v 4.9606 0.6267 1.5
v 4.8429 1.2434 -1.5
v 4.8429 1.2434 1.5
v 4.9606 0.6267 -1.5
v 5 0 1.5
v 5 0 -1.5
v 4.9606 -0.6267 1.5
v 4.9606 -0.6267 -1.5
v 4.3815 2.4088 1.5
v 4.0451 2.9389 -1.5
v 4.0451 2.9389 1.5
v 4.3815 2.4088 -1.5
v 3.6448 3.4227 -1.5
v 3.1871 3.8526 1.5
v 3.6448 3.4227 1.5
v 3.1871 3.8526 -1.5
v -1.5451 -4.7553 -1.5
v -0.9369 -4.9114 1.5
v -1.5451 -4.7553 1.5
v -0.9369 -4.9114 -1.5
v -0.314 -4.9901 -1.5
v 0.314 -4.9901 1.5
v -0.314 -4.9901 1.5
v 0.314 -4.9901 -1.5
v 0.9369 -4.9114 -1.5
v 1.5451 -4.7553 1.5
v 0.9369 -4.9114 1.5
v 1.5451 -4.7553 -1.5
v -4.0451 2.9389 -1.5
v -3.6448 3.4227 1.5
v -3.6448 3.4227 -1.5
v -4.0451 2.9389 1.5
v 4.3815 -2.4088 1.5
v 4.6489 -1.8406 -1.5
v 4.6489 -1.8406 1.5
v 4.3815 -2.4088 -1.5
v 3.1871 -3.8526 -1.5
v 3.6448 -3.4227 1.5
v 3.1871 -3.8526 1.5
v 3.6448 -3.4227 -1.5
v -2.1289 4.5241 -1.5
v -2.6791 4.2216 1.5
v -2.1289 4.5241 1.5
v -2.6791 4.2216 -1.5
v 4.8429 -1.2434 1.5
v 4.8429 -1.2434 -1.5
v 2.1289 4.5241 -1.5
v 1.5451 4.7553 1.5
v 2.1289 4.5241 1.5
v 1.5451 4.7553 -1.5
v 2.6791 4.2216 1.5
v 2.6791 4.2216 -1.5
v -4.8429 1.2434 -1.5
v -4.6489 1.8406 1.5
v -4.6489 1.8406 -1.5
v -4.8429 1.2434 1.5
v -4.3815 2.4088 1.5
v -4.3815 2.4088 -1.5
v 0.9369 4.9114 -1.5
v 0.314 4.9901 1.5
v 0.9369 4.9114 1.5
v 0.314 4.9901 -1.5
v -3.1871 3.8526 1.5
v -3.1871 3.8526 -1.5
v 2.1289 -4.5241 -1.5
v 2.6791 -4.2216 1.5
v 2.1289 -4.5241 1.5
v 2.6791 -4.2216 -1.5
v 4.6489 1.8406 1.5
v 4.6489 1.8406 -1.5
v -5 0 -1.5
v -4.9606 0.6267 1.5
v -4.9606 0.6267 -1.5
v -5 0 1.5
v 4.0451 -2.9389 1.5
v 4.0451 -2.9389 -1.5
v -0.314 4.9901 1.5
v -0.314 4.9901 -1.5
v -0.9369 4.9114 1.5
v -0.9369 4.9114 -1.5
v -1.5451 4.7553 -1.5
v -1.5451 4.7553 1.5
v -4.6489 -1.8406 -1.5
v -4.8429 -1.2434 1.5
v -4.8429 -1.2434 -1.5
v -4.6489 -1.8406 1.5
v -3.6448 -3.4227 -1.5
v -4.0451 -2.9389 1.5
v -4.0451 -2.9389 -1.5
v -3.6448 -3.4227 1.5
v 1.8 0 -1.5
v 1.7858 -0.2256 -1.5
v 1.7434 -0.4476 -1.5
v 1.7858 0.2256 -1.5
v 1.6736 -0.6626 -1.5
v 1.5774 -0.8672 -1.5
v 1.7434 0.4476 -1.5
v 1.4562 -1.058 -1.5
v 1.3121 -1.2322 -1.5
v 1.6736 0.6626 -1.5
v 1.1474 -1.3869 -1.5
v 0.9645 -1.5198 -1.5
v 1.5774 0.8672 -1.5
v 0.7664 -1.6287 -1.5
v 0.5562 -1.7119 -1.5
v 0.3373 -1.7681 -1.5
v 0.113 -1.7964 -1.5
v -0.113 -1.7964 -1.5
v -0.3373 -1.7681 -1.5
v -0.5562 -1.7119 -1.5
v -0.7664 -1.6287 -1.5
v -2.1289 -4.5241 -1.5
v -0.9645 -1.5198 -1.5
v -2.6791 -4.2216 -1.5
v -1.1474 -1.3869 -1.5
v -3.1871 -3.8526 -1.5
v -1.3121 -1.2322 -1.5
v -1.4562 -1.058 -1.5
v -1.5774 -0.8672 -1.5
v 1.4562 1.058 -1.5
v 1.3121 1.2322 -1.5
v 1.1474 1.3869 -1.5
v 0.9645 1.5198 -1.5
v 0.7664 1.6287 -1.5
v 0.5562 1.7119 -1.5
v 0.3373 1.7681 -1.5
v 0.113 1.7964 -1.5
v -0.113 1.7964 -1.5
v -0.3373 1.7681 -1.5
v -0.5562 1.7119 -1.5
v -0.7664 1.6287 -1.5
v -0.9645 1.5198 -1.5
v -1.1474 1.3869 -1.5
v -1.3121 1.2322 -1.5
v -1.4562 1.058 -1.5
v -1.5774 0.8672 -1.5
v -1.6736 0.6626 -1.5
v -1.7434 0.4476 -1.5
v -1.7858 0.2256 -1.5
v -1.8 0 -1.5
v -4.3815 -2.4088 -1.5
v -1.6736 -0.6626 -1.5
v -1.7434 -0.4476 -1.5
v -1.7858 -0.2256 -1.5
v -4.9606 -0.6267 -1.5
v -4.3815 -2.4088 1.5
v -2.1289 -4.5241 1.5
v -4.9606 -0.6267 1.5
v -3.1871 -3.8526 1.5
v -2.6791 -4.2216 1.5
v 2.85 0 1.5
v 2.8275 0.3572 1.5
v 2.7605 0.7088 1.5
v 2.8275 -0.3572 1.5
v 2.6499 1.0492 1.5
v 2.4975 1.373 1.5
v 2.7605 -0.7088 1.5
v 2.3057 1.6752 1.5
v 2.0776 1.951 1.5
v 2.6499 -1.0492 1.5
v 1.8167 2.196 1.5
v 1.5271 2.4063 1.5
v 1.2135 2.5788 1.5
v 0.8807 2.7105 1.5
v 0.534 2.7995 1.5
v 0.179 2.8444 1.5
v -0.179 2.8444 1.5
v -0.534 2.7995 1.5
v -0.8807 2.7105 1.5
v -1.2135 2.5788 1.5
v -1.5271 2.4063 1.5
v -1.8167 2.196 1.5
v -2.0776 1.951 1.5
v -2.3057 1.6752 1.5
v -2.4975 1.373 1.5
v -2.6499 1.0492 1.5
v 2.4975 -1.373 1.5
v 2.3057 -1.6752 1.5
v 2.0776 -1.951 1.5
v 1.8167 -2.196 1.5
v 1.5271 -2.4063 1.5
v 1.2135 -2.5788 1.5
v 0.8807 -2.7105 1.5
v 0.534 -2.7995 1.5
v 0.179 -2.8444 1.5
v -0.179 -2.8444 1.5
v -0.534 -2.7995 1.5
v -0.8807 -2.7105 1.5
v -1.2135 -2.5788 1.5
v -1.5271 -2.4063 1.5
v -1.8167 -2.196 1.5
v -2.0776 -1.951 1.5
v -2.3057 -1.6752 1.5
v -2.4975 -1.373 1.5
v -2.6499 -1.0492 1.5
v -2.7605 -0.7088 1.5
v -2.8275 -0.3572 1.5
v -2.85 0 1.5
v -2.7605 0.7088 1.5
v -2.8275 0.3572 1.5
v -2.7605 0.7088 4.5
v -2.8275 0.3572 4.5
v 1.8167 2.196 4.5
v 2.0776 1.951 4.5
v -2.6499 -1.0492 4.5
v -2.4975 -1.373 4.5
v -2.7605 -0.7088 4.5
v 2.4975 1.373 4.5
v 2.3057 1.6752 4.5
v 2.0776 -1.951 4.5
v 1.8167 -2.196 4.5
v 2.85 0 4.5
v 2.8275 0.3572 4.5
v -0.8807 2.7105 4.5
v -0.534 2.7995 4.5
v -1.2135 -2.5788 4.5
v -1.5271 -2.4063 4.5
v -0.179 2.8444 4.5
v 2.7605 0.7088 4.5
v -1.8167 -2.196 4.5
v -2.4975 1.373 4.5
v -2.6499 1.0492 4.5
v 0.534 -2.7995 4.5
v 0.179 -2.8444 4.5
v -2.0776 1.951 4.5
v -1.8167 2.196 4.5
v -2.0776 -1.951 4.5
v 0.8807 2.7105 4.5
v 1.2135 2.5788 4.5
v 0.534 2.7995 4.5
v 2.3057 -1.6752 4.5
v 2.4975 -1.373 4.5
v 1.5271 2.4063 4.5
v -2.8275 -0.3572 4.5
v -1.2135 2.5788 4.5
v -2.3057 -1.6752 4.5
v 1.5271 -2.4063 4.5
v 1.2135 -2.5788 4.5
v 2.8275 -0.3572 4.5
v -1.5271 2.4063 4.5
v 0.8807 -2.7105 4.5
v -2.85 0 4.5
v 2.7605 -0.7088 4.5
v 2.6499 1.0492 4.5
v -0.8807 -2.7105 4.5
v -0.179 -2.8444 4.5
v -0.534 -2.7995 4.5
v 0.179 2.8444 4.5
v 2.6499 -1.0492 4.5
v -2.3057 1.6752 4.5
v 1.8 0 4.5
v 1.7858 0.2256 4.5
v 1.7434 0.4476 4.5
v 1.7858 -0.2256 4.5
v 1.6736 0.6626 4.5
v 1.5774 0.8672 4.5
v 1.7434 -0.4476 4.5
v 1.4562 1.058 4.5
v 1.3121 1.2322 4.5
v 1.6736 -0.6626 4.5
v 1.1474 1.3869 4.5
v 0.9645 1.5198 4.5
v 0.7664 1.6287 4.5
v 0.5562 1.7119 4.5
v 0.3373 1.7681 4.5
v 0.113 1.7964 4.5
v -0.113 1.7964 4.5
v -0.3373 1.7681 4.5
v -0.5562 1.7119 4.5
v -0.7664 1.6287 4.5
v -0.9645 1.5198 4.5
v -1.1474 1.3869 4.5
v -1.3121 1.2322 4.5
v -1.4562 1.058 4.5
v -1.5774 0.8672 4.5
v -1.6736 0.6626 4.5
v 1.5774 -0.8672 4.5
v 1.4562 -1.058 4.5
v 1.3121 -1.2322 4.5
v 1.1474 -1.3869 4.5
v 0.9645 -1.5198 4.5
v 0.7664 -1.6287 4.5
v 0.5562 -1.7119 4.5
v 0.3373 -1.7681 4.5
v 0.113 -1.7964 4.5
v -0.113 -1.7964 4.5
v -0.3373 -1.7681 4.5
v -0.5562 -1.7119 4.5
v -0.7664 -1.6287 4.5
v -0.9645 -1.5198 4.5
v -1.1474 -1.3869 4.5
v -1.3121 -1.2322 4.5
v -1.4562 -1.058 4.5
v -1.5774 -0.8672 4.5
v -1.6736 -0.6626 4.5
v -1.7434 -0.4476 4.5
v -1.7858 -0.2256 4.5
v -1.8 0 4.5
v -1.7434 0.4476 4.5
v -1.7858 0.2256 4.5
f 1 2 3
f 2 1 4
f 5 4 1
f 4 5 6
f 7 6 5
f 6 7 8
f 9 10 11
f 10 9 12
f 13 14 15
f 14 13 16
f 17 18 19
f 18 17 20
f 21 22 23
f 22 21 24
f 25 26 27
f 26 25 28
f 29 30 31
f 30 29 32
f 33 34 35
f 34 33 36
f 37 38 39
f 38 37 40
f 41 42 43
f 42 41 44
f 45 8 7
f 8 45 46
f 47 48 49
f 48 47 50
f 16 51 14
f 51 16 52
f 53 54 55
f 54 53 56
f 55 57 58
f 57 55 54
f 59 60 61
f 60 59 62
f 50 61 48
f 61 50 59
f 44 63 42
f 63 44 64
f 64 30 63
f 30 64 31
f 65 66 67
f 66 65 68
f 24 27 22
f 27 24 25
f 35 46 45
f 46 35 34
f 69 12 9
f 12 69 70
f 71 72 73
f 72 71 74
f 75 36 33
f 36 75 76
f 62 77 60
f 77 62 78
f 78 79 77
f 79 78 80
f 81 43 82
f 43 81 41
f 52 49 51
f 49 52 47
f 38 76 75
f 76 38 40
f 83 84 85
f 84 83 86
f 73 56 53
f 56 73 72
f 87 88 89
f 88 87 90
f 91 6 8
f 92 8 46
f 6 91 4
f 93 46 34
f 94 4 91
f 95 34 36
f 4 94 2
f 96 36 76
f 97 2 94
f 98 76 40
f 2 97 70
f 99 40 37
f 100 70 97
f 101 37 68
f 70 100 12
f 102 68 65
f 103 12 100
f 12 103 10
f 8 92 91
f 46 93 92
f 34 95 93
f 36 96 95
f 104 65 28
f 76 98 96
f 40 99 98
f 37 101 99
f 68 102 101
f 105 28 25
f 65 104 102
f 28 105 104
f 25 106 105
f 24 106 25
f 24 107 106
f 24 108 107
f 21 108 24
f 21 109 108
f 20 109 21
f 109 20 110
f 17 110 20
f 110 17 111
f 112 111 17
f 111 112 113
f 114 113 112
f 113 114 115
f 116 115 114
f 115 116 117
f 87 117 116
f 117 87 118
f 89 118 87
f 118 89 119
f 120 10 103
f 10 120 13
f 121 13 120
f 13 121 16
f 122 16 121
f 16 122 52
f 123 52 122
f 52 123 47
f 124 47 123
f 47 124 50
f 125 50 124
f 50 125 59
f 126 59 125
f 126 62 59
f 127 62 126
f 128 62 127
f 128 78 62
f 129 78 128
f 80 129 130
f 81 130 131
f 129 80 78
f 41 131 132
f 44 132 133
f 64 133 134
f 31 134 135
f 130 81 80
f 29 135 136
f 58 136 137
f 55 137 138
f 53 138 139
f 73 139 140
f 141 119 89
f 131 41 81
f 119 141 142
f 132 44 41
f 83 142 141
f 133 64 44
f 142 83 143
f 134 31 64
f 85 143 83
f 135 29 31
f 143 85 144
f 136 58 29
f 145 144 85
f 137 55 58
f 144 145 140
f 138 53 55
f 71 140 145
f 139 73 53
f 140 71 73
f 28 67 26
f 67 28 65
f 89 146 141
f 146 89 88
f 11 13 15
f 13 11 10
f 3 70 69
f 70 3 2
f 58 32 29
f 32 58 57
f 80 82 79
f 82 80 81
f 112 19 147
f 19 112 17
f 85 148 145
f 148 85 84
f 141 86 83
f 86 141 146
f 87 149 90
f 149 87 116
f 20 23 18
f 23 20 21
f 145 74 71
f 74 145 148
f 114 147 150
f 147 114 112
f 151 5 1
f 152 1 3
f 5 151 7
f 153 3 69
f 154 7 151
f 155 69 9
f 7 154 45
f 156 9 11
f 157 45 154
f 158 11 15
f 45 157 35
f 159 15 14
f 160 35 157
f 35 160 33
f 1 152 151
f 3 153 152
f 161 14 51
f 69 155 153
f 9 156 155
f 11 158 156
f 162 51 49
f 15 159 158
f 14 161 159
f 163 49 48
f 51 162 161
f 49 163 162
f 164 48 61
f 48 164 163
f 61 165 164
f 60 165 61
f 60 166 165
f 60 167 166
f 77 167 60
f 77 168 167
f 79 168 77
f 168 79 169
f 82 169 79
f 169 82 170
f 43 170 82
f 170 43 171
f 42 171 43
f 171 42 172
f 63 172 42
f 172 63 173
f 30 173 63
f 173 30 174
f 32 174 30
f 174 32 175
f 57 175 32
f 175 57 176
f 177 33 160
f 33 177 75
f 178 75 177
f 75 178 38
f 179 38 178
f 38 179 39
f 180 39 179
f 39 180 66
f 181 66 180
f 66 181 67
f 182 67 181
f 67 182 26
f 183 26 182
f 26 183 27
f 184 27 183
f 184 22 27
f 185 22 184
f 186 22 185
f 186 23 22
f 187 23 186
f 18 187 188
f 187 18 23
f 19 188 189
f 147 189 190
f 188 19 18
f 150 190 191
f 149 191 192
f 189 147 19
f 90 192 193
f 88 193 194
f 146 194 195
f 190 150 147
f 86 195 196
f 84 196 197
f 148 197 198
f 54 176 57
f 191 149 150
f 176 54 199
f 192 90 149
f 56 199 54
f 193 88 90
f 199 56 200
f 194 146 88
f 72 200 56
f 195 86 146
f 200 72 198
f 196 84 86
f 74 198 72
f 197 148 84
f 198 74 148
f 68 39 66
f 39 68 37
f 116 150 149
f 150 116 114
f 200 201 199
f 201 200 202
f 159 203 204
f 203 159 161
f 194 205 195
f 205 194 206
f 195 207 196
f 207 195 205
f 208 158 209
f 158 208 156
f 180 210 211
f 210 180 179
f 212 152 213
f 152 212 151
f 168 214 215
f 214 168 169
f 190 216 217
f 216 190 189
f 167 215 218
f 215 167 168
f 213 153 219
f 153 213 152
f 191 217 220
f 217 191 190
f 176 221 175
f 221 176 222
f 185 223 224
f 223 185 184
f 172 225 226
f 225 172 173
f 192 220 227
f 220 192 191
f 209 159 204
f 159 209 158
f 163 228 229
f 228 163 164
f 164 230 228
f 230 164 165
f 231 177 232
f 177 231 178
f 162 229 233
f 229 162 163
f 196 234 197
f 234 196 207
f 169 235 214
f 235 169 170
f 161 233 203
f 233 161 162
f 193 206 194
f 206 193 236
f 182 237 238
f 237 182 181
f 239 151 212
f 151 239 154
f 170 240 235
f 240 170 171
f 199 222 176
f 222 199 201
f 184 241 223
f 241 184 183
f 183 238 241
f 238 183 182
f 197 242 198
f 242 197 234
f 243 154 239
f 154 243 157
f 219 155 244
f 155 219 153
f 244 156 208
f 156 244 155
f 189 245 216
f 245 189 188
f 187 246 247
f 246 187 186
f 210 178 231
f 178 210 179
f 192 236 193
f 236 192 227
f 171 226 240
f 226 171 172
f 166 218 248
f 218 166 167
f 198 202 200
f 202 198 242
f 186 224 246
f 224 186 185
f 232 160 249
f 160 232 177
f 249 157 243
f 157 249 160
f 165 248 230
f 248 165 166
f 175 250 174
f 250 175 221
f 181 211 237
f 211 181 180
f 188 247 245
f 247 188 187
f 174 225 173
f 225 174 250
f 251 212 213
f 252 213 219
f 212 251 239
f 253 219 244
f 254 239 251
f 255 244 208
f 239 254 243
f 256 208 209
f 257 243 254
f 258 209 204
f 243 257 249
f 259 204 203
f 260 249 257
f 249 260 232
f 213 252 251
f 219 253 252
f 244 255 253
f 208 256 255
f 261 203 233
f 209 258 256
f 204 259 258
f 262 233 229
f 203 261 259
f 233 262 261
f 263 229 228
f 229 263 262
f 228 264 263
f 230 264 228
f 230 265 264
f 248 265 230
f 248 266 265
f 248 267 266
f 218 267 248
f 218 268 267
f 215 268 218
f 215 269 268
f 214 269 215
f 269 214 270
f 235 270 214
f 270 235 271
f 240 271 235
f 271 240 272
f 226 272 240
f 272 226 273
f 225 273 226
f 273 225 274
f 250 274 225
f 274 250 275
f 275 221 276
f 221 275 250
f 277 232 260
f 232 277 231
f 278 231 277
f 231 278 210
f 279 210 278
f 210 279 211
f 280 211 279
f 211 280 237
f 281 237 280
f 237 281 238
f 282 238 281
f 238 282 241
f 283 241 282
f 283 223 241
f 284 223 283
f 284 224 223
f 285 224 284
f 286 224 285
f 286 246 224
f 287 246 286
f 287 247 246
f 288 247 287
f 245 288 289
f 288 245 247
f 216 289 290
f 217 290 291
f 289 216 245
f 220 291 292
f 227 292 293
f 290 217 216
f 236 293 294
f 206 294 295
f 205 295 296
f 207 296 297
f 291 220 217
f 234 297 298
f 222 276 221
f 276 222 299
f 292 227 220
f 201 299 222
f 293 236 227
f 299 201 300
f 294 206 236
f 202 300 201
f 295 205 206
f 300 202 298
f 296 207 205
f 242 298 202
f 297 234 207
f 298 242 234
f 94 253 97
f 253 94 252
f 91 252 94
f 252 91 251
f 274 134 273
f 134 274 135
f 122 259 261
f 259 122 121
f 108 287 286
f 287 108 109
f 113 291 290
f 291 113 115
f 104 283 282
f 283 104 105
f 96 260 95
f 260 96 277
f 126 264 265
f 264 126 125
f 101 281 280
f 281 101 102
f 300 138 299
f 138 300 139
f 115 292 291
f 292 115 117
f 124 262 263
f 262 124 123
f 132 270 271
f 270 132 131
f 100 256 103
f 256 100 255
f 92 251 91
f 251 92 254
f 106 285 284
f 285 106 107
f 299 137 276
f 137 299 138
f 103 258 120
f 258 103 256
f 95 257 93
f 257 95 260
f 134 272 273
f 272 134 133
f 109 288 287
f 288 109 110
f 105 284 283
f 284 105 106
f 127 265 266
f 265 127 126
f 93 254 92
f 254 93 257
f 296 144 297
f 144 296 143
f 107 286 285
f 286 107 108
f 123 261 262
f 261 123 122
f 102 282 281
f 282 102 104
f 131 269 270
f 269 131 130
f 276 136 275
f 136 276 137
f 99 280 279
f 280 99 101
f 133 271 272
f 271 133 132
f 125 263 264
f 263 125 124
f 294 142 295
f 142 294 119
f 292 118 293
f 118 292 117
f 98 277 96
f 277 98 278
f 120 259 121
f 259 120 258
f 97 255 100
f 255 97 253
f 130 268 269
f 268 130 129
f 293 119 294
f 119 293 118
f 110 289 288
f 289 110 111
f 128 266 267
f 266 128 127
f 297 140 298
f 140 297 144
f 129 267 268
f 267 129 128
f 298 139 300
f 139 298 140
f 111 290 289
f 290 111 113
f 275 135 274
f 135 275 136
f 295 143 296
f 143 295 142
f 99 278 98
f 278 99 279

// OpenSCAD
$fn = 50;


difference() {
	union() {
		translate(v = [0, 0, -1.5000000000]) {
			rotate(a = [0, 0, 0]) {
				cylinder(h = 3, r = 5.0000000000);
			}
		}
		translate(v = [0, 0, -1.5000000000]) {
			rotate(a = [0, 0, 0]) {
				cylinder(h = 6, r = 2.8500000000);
			}
		}
	}
	union() {
		translate(v = [0, 0, -125.0000000000]) {
			rotate(a = [0, 0, 0]) {
				cylinder(h = 250, r = 1.8000000000);
			}
		}
	}
}
